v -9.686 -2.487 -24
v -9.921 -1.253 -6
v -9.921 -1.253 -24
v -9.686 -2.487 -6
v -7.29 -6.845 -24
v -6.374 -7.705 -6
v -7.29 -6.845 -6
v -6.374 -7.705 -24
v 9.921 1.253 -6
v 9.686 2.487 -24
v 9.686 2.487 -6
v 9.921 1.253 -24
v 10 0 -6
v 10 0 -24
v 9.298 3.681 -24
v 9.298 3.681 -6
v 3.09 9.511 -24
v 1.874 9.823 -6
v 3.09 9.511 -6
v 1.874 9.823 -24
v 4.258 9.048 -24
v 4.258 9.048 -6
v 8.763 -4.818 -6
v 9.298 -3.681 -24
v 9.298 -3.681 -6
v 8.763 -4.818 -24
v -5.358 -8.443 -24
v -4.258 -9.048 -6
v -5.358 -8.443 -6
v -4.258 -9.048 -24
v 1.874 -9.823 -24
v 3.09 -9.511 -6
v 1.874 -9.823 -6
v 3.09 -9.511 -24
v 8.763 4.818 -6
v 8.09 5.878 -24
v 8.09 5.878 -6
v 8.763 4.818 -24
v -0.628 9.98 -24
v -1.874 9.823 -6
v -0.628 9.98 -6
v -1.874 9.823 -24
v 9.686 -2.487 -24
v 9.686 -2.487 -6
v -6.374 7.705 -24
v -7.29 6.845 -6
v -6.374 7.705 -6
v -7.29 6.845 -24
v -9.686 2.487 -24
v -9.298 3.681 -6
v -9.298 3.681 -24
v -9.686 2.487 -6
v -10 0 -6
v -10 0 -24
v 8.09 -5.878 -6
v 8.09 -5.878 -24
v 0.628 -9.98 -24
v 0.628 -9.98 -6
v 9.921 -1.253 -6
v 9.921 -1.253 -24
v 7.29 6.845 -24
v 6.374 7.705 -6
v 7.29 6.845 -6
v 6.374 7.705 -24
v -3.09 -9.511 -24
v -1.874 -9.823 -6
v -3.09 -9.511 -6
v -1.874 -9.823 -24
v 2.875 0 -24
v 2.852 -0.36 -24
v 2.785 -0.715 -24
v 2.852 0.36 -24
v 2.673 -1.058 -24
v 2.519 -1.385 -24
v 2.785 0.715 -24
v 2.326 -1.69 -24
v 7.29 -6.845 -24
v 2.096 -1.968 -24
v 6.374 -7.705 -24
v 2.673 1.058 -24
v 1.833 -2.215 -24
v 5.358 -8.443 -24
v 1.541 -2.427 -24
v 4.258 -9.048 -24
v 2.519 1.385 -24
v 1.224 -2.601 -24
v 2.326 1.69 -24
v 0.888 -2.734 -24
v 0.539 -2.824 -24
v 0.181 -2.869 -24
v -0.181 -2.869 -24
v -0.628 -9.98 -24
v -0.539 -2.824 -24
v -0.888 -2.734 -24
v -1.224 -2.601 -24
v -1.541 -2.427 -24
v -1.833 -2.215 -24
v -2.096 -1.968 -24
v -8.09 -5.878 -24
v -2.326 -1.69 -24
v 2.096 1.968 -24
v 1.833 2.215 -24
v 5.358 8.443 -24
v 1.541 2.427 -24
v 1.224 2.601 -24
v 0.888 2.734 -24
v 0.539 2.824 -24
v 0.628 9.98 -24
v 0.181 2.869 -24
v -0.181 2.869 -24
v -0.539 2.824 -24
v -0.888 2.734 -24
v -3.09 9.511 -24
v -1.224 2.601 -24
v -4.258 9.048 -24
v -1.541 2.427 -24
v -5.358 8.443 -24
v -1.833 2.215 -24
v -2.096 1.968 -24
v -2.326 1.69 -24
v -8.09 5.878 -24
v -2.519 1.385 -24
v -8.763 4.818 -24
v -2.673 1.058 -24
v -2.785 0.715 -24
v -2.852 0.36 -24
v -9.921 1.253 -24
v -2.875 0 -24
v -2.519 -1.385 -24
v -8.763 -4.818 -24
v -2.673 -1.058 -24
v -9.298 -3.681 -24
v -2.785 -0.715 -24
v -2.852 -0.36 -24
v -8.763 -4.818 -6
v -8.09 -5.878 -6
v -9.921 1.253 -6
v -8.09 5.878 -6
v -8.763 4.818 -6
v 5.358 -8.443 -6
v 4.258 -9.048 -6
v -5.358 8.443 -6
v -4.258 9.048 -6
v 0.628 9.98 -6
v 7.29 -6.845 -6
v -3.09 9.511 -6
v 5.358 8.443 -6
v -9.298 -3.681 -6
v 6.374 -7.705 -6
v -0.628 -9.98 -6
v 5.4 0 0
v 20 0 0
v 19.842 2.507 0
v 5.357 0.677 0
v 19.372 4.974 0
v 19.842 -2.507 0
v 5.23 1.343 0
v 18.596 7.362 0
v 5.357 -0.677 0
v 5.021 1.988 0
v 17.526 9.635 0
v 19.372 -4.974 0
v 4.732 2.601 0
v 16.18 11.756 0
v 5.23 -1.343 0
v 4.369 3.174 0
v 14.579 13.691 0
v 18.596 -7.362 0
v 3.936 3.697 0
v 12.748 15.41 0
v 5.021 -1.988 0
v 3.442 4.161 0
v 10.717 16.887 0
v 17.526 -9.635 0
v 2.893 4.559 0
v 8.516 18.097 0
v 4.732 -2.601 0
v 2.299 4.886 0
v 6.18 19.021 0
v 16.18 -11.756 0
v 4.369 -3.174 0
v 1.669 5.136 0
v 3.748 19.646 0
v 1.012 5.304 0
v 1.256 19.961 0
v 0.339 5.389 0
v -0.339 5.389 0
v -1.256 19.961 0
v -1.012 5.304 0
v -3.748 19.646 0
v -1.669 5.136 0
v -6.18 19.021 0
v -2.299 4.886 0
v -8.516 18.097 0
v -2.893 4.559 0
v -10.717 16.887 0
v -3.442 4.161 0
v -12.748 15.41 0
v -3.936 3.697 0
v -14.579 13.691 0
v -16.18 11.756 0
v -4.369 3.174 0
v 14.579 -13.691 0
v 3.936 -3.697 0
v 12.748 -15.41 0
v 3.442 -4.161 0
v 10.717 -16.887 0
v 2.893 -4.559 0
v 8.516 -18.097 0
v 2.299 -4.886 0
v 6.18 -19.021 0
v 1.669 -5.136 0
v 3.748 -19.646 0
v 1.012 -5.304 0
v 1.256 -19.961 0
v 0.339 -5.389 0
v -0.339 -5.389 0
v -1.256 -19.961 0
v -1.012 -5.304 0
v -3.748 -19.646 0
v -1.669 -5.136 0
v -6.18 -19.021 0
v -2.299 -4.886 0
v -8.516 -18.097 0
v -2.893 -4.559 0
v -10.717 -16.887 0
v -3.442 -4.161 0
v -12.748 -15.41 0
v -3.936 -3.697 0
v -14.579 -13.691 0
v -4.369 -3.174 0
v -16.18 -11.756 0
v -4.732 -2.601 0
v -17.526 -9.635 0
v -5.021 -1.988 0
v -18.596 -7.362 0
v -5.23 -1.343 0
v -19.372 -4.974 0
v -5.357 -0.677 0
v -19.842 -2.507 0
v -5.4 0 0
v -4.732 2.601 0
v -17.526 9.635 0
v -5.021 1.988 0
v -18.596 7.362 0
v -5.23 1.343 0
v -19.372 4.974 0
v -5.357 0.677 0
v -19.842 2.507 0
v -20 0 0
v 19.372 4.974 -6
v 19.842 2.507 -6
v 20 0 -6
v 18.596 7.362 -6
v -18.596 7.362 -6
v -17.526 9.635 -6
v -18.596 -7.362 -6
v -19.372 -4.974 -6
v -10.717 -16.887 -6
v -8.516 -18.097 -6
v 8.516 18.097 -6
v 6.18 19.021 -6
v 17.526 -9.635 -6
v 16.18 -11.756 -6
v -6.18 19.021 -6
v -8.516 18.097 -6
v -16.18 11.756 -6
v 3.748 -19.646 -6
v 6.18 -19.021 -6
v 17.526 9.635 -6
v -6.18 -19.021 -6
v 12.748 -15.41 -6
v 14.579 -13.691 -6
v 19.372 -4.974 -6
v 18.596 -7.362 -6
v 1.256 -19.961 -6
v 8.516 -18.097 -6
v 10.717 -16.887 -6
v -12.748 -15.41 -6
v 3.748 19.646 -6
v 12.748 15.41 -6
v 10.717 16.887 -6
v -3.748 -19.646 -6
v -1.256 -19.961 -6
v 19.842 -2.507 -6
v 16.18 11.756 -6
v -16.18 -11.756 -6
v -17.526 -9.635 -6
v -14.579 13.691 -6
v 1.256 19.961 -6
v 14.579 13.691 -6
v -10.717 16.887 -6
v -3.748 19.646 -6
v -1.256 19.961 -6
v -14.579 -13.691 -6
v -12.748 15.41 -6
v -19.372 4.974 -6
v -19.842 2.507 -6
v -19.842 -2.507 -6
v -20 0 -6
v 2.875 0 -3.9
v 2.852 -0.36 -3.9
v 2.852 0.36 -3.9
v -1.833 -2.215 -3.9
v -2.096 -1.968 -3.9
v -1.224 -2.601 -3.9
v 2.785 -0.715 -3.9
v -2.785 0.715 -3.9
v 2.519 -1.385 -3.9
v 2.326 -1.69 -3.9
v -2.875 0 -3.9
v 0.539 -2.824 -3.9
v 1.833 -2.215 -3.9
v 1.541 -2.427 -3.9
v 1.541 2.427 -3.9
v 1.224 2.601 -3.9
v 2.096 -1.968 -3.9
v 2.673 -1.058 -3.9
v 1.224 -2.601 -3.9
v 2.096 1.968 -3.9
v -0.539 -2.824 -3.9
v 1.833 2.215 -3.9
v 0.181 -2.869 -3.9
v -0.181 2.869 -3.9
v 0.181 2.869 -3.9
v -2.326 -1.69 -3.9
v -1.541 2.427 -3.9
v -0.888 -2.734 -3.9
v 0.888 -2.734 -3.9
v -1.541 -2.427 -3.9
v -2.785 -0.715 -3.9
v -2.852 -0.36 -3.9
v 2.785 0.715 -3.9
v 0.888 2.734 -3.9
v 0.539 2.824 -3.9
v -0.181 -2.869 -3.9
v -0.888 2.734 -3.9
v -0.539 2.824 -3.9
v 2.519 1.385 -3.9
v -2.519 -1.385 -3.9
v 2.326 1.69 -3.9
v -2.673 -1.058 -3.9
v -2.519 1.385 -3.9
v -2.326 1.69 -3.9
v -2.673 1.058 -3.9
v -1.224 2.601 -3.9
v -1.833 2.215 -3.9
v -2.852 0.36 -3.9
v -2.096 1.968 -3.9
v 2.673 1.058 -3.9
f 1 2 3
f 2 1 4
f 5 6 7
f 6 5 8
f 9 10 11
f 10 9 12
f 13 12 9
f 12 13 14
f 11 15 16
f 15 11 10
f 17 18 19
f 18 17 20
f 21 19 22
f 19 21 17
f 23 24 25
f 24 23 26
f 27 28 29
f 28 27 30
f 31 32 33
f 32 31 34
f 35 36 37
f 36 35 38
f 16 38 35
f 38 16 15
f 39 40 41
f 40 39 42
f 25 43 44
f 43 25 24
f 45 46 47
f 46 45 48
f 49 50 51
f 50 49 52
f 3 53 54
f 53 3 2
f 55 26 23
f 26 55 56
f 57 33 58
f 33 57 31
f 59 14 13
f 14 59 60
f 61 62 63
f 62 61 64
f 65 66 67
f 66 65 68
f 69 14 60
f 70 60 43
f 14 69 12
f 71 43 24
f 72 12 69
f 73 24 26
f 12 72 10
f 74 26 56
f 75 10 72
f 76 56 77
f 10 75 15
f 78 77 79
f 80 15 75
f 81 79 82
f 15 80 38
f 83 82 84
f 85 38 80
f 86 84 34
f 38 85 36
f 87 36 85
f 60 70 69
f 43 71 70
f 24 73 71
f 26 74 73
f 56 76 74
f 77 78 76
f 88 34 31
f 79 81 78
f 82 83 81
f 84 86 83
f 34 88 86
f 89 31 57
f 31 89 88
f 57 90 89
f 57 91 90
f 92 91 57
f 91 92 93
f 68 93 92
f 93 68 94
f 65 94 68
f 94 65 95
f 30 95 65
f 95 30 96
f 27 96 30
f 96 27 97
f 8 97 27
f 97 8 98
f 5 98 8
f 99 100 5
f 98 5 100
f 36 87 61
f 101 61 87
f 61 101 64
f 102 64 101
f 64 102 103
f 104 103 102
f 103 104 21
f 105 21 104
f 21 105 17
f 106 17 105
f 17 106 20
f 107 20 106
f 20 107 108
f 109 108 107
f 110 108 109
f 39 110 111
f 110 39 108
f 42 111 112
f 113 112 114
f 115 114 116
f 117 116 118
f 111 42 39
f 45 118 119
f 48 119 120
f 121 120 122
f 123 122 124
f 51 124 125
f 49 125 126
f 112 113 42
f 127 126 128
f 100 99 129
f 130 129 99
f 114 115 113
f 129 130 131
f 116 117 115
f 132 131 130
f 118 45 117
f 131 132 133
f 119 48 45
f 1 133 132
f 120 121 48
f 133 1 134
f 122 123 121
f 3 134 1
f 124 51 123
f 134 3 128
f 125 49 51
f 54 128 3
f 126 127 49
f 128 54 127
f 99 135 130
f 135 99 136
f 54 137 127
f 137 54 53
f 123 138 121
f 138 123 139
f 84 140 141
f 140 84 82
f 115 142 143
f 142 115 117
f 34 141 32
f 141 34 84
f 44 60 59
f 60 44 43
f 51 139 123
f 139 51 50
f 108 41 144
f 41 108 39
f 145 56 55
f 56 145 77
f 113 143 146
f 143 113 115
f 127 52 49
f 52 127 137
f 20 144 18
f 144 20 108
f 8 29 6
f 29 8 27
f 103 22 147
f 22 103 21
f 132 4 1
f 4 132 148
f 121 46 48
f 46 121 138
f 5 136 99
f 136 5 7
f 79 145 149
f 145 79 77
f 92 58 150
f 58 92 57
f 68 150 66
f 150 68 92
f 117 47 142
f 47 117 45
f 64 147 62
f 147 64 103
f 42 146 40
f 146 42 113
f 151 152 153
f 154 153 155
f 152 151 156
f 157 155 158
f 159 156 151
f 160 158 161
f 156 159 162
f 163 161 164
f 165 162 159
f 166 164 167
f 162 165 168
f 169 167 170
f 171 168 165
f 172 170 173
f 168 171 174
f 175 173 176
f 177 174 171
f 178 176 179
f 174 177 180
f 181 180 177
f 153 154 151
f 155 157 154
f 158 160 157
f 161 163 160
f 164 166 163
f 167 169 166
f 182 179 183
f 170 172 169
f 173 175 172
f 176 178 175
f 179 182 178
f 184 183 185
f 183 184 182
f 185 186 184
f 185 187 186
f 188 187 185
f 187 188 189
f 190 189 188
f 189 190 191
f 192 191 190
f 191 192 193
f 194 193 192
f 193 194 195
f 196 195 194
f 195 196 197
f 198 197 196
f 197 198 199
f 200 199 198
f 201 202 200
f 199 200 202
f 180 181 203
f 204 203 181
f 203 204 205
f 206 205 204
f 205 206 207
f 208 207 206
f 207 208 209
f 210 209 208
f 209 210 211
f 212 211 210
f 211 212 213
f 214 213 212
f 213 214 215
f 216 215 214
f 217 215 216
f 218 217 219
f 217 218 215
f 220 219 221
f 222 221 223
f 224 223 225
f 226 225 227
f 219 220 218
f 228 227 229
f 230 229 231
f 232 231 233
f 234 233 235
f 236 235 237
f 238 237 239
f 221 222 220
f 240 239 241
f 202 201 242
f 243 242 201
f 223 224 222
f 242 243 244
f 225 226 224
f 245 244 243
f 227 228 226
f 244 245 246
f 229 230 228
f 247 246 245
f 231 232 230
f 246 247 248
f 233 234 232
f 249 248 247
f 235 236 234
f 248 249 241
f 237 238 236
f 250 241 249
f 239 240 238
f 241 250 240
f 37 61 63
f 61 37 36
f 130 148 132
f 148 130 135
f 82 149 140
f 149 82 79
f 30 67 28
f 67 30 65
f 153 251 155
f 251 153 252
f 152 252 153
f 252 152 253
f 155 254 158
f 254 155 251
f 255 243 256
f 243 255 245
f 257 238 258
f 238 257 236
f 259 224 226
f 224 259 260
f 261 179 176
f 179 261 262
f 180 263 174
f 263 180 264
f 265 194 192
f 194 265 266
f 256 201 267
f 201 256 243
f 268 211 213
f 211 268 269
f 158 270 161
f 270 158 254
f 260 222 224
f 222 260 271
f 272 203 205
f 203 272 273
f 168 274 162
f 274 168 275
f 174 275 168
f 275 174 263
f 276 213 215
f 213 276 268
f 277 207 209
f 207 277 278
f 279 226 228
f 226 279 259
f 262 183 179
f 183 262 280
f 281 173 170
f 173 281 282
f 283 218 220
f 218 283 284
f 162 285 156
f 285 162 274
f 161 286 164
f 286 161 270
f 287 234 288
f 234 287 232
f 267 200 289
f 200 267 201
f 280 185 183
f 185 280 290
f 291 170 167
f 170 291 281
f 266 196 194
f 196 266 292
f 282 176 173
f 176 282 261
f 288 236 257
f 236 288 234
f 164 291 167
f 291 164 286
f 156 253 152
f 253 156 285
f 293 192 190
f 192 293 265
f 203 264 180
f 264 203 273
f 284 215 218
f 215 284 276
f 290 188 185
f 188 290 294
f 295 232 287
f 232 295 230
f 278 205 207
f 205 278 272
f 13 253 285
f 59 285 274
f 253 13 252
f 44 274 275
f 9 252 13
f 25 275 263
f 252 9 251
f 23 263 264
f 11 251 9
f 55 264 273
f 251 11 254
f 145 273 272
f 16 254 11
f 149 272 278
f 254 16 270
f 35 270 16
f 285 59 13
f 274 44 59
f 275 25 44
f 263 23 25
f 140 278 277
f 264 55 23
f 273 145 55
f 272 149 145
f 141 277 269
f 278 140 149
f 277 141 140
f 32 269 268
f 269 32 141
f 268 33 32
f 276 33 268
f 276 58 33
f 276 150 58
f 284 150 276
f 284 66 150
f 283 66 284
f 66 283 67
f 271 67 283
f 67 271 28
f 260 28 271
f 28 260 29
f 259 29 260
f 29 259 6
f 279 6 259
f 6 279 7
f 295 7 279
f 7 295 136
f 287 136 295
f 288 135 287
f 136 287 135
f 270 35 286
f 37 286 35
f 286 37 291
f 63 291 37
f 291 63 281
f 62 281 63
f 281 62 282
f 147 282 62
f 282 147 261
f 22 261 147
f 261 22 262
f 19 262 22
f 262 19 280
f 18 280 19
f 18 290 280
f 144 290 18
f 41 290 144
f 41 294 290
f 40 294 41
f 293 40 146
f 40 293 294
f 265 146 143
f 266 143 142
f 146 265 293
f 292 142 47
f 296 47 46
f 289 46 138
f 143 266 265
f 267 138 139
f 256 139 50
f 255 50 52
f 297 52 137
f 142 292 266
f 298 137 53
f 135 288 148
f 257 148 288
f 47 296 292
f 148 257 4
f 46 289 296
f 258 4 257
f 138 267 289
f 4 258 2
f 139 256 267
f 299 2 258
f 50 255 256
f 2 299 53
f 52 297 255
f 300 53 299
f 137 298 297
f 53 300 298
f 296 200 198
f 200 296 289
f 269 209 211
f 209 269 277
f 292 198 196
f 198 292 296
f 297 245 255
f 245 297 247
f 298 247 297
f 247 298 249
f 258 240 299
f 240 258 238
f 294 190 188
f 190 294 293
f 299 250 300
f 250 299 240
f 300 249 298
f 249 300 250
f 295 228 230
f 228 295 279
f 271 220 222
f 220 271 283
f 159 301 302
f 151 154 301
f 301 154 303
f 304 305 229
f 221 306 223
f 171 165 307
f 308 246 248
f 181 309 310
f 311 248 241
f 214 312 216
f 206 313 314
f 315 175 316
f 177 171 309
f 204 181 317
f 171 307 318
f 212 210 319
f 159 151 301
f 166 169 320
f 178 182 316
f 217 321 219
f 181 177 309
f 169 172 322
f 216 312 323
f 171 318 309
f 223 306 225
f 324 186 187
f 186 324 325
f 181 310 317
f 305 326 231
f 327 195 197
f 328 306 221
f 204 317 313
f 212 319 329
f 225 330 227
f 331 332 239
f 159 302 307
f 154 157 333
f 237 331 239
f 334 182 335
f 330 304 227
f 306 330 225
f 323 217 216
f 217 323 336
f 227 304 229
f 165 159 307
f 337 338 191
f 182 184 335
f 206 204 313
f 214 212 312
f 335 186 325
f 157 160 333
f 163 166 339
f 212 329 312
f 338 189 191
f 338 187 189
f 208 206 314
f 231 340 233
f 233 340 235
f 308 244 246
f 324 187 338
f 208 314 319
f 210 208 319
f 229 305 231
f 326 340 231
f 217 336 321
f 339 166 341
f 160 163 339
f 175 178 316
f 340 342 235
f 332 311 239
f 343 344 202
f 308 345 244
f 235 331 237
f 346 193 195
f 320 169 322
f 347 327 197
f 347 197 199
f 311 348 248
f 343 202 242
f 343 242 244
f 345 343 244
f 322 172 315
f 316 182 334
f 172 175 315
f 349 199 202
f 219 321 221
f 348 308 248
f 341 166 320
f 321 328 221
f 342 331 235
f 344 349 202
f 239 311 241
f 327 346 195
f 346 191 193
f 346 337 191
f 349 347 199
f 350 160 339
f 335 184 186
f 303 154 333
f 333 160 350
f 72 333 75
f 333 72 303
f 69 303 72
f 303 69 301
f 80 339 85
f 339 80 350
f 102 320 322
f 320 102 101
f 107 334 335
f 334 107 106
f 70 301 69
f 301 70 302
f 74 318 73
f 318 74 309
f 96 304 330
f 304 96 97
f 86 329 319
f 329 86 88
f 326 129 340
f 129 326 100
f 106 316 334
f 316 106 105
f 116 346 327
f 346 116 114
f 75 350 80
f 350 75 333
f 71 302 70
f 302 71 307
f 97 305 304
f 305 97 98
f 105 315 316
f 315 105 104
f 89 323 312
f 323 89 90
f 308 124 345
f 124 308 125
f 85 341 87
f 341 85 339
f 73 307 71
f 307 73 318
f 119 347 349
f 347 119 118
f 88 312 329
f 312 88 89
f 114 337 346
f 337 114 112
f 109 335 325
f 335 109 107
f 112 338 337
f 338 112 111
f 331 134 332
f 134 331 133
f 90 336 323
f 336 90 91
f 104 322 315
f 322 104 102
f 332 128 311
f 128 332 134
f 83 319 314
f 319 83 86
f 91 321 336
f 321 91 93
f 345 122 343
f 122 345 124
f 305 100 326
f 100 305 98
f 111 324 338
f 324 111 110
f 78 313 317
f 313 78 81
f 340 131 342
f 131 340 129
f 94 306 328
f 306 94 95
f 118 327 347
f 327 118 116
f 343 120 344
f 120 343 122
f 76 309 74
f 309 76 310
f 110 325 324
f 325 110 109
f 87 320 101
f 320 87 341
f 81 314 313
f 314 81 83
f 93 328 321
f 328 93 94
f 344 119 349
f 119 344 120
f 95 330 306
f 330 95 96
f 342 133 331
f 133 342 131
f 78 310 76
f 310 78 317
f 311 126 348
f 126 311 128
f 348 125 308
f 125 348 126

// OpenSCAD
$fn = 50;


difference() {
	union() {
		translate(v = [0, 0, -24.0000000000]) {
			cylinder(h = 24, r = 10.0000000000);
		}
		translate(v = [0, 0, -6.0000000000]) {
			cylinder(h = 6, r = 20.0000000000);
		}
	}
	union() {
		translate(v = [0, 0, 0]) {
			rotate(a = [0, 0, 0]) {
				difference() {
					union() {
						#translate(v = [0, 0, -24.0000000000]) {
							cylinder(h = 24, r = 2.6000000000);
						}
						#translate(v = [0, 0, -3.9000000000]) {
							cylinder(h = 3.9000000000, r = 10.0000000000, r1 = 2.8750000000, r2 = 5.4000000000);
						}
						#translate(v = [0, 0, -24.0000000000]) {
							cylinder(h = 24, r = 2.8750000000);
						}
						#translate(v = [0, 0, -24.0000000000]) {
							cylinder(h = 24, r = 2.6000000000);
						}
					}
					union();
				}
			}
		}
	}
}
